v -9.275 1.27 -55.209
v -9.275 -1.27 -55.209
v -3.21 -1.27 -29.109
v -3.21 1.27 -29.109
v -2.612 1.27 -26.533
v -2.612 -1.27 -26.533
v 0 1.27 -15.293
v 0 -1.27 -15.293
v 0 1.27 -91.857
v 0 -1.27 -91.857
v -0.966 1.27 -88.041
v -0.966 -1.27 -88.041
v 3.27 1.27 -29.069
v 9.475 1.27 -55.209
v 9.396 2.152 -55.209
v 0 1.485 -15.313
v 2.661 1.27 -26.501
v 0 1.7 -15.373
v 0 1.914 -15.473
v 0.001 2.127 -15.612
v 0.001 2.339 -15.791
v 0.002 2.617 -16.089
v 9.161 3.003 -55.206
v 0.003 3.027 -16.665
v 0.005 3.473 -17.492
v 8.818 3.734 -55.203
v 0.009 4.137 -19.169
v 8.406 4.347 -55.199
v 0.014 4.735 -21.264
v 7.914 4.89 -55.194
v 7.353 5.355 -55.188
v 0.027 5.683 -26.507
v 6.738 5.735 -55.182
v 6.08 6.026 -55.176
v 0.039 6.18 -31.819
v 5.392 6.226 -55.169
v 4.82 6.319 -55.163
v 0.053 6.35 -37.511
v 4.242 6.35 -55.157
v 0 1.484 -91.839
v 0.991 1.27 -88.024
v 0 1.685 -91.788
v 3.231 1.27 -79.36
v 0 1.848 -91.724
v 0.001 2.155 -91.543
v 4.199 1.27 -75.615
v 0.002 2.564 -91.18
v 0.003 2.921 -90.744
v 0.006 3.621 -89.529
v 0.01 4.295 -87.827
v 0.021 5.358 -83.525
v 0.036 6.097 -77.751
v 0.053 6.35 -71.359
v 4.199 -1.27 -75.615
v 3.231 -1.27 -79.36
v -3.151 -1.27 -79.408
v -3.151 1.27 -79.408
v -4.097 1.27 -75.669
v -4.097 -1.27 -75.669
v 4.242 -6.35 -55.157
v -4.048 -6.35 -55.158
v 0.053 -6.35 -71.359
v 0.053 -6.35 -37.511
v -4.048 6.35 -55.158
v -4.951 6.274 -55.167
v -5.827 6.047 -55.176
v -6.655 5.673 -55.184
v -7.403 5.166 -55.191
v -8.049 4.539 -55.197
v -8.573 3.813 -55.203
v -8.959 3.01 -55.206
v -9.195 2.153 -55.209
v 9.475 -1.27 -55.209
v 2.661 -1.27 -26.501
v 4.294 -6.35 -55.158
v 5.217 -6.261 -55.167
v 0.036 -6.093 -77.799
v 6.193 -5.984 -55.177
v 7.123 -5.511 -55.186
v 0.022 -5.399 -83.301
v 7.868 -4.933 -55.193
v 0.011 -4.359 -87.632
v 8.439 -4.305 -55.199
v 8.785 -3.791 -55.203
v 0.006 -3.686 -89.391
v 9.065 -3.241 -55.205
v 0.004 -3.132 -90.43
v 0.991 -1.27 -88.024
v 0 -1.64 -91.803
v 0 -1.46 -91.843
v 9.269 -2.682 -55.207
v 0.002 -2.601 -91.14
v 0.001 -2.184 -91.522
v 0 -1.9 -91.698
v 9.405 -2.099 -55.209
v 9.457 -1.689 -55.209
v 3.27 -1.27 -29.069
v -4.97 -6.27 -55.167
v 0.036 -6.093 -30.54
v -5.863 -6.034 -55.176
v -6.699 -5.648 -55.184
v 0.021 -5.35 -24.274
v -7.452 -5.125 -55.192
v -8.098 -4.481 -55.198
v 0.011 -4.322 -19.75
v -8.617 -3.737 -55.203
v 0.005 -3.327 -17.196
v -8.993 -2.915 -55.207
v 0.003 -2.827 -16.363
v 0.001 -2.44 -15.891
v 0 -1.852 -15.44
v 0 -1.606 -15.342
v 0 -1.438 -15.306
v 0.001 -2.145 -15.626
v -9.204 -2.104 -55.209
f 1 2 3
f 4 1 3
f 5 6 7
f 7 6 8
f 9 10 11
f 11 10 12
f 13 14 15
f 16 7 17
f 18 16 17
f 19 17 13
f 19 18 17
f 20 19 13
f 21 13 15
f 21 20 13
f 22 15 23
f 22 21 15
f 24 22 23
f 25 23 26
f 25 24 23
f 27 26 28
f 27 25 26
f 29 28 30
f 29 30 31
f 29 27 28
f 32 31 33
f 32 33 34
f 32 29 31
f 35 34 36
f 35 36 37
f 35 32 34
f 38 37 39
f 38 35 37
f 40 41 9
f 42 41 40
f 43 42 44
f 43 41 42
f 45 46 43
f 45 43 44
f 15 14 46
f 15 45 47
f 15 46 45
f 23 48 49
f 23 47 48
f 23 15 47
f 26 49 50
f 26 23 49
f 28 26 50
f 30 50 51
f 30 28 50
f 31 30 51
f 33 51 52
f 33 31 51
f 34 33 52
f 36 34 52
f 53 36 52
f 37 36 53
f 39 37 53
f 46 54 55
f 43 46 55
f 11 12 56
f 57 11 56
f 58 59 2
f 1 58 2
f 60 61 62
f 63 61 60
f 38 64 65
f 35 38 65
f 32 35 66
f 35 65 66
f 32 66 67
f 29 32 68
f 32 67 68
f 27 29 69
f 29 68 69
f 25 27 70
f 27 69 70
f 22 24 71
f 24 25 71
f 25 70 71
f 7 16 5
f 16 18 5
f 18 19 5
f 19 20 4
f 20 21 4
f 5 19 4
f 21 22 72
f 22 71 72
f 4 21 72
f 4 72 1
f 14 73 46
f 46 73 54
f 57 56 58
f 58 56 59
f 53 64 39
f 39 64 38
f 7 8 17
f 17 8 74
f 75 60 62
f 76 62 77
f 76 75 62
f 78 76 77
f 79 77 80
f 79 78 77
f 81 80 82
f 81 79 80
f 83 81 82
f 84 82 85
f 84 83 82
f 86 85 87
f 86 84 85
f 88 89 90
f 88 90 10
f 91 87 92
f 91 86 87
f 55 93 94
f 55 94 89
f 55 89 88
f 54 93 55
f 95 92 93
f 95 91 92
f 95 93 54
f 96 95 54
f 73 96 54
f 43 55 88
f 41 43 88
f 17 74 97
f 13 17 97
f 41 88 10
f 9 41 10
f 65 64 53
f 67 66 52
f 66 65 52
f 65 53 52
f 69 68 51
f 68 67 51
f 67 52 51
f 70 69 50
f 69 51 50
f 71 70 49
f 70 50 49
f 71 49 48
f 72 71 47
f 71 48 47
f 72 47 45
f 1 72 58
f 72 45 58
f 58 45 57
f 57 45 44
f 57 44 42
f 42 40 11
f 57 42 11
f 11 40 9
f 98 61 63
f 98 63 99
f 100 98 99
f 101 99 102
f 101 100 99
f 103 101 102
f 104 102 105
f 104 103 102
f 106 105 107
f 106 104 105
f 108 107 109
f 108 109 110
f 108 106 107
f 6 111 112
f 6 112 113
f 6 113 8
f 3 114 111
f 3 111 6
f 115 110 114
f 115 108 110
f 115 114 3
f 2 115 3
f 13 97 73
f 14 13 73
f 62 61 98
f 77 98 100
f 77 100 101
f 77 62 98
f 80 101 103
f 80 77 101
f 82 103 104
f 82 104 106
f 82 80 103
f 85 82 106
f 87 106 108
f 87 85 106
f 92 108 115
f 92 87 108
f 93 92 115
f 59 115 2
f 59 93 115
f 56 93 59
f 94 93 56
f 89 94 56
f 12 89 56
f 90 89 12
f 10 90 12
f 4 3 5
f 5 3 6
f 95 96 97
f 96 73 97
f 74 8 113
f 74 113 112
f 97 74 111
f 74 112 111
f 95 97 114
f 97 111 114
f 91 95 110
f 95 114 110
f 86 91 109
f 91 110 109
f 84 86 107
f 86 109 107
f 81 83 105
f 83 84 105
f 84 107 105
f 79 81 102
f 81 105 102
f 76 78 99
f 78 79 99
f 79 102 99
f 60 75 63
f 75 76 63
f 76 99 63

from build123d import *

# Parameters (mm, degrees)
F1_DEPTH    = 6.35
F2_DEPTH    = 6.35
F4_DEPTH    = 25.4
F5_T1_DEPTH = 66.3794734437
F5_T3_DEPTH = 66.4252991911
F5_T5_DEPTH = 63.2525240866
F5_T7_DEPTH = 63.2028524021


# Not quite as in the source:
# - a fillet or chamfer that OpenCascade refuses, or shapes differently, is made with other operations: its cross-section is extruded or revolved along the edge and cut away or added


with BuildPart() as f1:
    # F0 (on Front) → F1 (new body)
    with BuildSketch(Plane.XZ):
        Polygon((10.5009634349, -8.6313571018), (0, -8.4001217037), (-10.5245159939, -8.168367669), (-8.3013391122, -91.856867075), (8.6683045514, -91.856867075), align=None)
    extrude(amount=F1_DEPTH)

    # F2 (add): a face of the model
    f2_faces = [f1.faces().sort_by_distance(p)[0] for p in [
        (0.0745348421, 0, -48.6438367355),
    ]]
    extrude(f2_faces, amount=F2_DEPTH)

    # F3 (on face) → F4 (cut)
    with BuildSketch(Plane.XZ.offset(6.35)):
        Polygon((7.741477061, -8.5705921125), (0, -12.6956291497), (-8.4089043082, -8.2149542811), (-10.5245159939, -8.168367669), (-10.4707083295, -10.1938847244), (0, -15.2933746576), (10.4665109394, -10.1959289555), (10.5009634349, -8.6313571018), align=None)
        Polygon((-8.4089043082, -8.2149542811), (0, -12.6956291497), (7.741477061, -8.5705921125), align=None)
        Polygon((0, -15.2933746576), (-10.4707083295, -10.1938847244), (-10.1647846318, -21.7099702861), (-2.6734457948, -26.4930181658), (-2.660532576, -26.5012629595), (-2.6115273083, -26.532551698), align=None)
        Polygon((10.2136542458, -21.6787681594), (10.4665109394, -10.1959289555), (0, -15.2933746576), (2.660532576, -26.5012629595), align=None)
        Polygon((-2.6734457948, -26.4930181658), (-10.1647846318, -21.7099702861), (-10.0923027152, -24.4384544155), (-3.4606218927, -28.9392464633), (-3.2699760565, -29.068634063), (-3.2102312503, -29.1091816943), (-2.6115273083, -26.532551698), (-2.660532576, -26.5012629595), align=None)
        Polygon((10.15380398, -24.3967147102), (10.2136542458, -21.6787681594), (2.660532576, -26.5012629595), (3.2699760565, -29.068634063), align=None)
        Polygon((-3.4606218927, -28.9392464633), (-10.0923027152, -24.4384544155), (-9.2748739024, -55.2094611118), (-3.2102312503, -29.1091816943), (-3.2699760565, -29.068634063), align=None)
        Polygon((9.4752950296, -55.2094611118), (10.15380398, -24.3967147102), (3.2699760565, -29.068634063), align=None)
        Polygon((-4.0967862529, -75.6694136894), (-9.2748739024, -55.2094611118), (-8.7972565245, -73.1887240187), (-4.2695118804, -75.5782571337), (-4.199302435, -75.6153104147), align=None)
        Polygon((9.0827017549, -73.0380792973), (9.4752950296, -55.2094611118), (4.199302435, -75.6153104147), align=None)
        Polygon((-3.1505538377, -79.4082206875), (-4.0967862529, -75.6694136894), (-4.199302435, -75.6153104147), (-4.2695118804, -75.5782571337), (-8.7972565245, -73.1887240187), (-8.7198462703, -76.1027287805), (-3.3105833326, -79.3132398248), (-3.2309755221, -79.3604887305), align=None)
        Polygon((9.0827017549, -73.0380792973), (4.199302435, -75.6153104147), (3.2309755221, -79.3604887305), (9.0191284413, -75.9250985328), align=None)
        Polygon((-0.965611629, -88.0414878319), (-3.1505538377, -79.4082206875), (-3.2309755221, -79.3604887305), (-3.3105833326, -79.3132398248), (-8.7198462703, -76.1027287805), (-8.5424459568, -82.7807246478), (-1.0061214638, -88.0133609601), (-0.9910429813, -88.023830283), align=None)
        Polygon((9.0191284413, -75.9250985328), (3.2309755221, -79.3604887305), (0.9910429813, -88.023830283), (8.8732221424, -82.5510594467), align=None)
        Polygon((0, -91.856867075), (-0.965611629, -88.0414878319), (-0.9910429813, -88.023830283), (-1.0061214638, -88.0133609601), (-8.5424459568, -82.7807246478), (-8.434321605, -86.8509202434), align=None)
        Polygon((8.8732221424, -82.5510594467), (0.9910429813, -88.023830283), (0, -91.856867075), (8.7830958233, -86.6439154273), align=None)
        Polygon((-8.3013391122, -91.856867075), (0, -91.856867075), (-8.434321605, -86.8509202434), align=None)
        Polygon((8.7830958233, -86.6439154273), (0, -91.856867075), (8.6683045514, -91.856867075), align=None)
    extrude(amount=-F4_DEPTH, mode=Mode.SUBTRACT)

    # F5: fillet of radius 5.08 on 8 edges, made by hand

    # F5_s2 → F5_t1 (cut)
    with BuildSketch(Plane(origin=(-15.5207879816, 0, -66.796500031), x_dir=(0, 1, 0), z_dir=(0.2263297481, 0, 0.9740507405))):
        with BuildLine():
            ThreePointArc((-6.35, -8.5413456341), (-4.8621024484, -4.9492431857), (-1.27, -3.4613456341))
            Line((-1.27, -3.4613456341), (-6.35, -3.4613456341))
            Line((-6.35, -3.4613456341), (-6.35, -8.5413456341))
        make_face()
        with BuildLine():
            ThreePointArc((6.35, -8.5413456341), (4.8621024484, -4.9492431857), (1.27, -3.4613456341))
            Line((1.27, -3.4613456341), (6.35, -3.4613456341))
            Line((6.35, -3.4613456341), (6.35, -8.5413456341))
        make_face()
    extrude(amount=F5_T1_DEPTH, mode=Mode.SUBTRACT)

    # F5_s4 → F5_t3 (cut)
    with BuildSketch(Plane(origin=(0.5034707355, 0, -2.1209451889), x_dir=(0, 1, 0), z_dir=(0.2309622408, 0, -0.9729627143))):
        with BuildLine():
            ThreePointArc((-1.27, -3.5321920799), (-4.8621024484, -5.0200896315), (-6.35, -8.6121920799))
            Line((-6.35, -8.6121920799), (-6.35, -3.5321920799))
            Line((-6.35, -3.5321920799), (-1.27, -3.5321920799))
        make_face()
        with BuildLine():
            ThreePointArc((1.27, -3.5321920799), (4.8621024484, -5.0200896315), (6.35, -8.6121920799))
            Line((6.35, -8.6121920799), (6.35, -3.5321920799))
            Line((6.35, -3.5321920799), (1.27, -3.5321920799))
        make_face()
    extrude(amount=F5_T3_DEPTH, mode=Mode.SUBTRACT)

    # F5_s6 → F5_t5 (cut)
    with BuildSketch(Plane(origin=(-9.6073030151, 0, -37.1579705651), x_dir=(0, 1, 0), z_dir=(-0.2503213526, 0, -0.9681628068))):
        with BuildLine():
            ThreePointArc((-6.35, 17.9137352141), (-4.8621024484, 21.5058376626), (-1.27, 22.9937352141))
            Line((-1.27, 22.9937352141), (-6.35, 22.9937352141))
            Line((-6.35, 22.9937352141), (-6.35, 17.9137352141))
        make_face()
        with BuildLine():
            ThreePointArc((1.27, 22.9937352141), (4.8621024484, 21.5058376626), (6.35, 17.9137352141))
            Line((6.35, 17.9137352141), (6.35, 22.9937352141))
            Line((6.35, 22.9937352141), (1.27, 22.9937352141))
        make_face()
    extrude(amount=F5_T5_DEPTH, mode=Mode.SUBTRACT)

    # F5_s8 → F5_t7 (cut)
    with BuildSketch(Plane(origin=(24.9640295189, 0, -98.6392843591), x_dir=(0, 1, 0), z_dir=(-0.2453485204, 0, 0.9694349403))):
        with BuildLine():
            ThreePointArc((-6.35, 17.4569464222), (-4.8621024484, 21.0490488706), (-1.27, 22.5369464222))
            Line((-1.27, 22.5369464222), (-6.35, 22.5369464222))
            Line((-6.35, 22.5369464222), (-6.35, 17.4569464222))
        make_face()
        with BuildLine():
            ThreePointArc((6.35, 17.4569464222), (4.8621024484, 21.0490488706), (1.27, 22.5369464222))
            Line((1.27, 22.5369464222), (6.35, 22.5369464222))
            Line((6.35, 22.5369464222), (6.35, 17.4569464222))
        make_face()
    extrude(amount=F5_T7_DEPTH, mode=Mode.SUBTRACT)


solid = f1.part
